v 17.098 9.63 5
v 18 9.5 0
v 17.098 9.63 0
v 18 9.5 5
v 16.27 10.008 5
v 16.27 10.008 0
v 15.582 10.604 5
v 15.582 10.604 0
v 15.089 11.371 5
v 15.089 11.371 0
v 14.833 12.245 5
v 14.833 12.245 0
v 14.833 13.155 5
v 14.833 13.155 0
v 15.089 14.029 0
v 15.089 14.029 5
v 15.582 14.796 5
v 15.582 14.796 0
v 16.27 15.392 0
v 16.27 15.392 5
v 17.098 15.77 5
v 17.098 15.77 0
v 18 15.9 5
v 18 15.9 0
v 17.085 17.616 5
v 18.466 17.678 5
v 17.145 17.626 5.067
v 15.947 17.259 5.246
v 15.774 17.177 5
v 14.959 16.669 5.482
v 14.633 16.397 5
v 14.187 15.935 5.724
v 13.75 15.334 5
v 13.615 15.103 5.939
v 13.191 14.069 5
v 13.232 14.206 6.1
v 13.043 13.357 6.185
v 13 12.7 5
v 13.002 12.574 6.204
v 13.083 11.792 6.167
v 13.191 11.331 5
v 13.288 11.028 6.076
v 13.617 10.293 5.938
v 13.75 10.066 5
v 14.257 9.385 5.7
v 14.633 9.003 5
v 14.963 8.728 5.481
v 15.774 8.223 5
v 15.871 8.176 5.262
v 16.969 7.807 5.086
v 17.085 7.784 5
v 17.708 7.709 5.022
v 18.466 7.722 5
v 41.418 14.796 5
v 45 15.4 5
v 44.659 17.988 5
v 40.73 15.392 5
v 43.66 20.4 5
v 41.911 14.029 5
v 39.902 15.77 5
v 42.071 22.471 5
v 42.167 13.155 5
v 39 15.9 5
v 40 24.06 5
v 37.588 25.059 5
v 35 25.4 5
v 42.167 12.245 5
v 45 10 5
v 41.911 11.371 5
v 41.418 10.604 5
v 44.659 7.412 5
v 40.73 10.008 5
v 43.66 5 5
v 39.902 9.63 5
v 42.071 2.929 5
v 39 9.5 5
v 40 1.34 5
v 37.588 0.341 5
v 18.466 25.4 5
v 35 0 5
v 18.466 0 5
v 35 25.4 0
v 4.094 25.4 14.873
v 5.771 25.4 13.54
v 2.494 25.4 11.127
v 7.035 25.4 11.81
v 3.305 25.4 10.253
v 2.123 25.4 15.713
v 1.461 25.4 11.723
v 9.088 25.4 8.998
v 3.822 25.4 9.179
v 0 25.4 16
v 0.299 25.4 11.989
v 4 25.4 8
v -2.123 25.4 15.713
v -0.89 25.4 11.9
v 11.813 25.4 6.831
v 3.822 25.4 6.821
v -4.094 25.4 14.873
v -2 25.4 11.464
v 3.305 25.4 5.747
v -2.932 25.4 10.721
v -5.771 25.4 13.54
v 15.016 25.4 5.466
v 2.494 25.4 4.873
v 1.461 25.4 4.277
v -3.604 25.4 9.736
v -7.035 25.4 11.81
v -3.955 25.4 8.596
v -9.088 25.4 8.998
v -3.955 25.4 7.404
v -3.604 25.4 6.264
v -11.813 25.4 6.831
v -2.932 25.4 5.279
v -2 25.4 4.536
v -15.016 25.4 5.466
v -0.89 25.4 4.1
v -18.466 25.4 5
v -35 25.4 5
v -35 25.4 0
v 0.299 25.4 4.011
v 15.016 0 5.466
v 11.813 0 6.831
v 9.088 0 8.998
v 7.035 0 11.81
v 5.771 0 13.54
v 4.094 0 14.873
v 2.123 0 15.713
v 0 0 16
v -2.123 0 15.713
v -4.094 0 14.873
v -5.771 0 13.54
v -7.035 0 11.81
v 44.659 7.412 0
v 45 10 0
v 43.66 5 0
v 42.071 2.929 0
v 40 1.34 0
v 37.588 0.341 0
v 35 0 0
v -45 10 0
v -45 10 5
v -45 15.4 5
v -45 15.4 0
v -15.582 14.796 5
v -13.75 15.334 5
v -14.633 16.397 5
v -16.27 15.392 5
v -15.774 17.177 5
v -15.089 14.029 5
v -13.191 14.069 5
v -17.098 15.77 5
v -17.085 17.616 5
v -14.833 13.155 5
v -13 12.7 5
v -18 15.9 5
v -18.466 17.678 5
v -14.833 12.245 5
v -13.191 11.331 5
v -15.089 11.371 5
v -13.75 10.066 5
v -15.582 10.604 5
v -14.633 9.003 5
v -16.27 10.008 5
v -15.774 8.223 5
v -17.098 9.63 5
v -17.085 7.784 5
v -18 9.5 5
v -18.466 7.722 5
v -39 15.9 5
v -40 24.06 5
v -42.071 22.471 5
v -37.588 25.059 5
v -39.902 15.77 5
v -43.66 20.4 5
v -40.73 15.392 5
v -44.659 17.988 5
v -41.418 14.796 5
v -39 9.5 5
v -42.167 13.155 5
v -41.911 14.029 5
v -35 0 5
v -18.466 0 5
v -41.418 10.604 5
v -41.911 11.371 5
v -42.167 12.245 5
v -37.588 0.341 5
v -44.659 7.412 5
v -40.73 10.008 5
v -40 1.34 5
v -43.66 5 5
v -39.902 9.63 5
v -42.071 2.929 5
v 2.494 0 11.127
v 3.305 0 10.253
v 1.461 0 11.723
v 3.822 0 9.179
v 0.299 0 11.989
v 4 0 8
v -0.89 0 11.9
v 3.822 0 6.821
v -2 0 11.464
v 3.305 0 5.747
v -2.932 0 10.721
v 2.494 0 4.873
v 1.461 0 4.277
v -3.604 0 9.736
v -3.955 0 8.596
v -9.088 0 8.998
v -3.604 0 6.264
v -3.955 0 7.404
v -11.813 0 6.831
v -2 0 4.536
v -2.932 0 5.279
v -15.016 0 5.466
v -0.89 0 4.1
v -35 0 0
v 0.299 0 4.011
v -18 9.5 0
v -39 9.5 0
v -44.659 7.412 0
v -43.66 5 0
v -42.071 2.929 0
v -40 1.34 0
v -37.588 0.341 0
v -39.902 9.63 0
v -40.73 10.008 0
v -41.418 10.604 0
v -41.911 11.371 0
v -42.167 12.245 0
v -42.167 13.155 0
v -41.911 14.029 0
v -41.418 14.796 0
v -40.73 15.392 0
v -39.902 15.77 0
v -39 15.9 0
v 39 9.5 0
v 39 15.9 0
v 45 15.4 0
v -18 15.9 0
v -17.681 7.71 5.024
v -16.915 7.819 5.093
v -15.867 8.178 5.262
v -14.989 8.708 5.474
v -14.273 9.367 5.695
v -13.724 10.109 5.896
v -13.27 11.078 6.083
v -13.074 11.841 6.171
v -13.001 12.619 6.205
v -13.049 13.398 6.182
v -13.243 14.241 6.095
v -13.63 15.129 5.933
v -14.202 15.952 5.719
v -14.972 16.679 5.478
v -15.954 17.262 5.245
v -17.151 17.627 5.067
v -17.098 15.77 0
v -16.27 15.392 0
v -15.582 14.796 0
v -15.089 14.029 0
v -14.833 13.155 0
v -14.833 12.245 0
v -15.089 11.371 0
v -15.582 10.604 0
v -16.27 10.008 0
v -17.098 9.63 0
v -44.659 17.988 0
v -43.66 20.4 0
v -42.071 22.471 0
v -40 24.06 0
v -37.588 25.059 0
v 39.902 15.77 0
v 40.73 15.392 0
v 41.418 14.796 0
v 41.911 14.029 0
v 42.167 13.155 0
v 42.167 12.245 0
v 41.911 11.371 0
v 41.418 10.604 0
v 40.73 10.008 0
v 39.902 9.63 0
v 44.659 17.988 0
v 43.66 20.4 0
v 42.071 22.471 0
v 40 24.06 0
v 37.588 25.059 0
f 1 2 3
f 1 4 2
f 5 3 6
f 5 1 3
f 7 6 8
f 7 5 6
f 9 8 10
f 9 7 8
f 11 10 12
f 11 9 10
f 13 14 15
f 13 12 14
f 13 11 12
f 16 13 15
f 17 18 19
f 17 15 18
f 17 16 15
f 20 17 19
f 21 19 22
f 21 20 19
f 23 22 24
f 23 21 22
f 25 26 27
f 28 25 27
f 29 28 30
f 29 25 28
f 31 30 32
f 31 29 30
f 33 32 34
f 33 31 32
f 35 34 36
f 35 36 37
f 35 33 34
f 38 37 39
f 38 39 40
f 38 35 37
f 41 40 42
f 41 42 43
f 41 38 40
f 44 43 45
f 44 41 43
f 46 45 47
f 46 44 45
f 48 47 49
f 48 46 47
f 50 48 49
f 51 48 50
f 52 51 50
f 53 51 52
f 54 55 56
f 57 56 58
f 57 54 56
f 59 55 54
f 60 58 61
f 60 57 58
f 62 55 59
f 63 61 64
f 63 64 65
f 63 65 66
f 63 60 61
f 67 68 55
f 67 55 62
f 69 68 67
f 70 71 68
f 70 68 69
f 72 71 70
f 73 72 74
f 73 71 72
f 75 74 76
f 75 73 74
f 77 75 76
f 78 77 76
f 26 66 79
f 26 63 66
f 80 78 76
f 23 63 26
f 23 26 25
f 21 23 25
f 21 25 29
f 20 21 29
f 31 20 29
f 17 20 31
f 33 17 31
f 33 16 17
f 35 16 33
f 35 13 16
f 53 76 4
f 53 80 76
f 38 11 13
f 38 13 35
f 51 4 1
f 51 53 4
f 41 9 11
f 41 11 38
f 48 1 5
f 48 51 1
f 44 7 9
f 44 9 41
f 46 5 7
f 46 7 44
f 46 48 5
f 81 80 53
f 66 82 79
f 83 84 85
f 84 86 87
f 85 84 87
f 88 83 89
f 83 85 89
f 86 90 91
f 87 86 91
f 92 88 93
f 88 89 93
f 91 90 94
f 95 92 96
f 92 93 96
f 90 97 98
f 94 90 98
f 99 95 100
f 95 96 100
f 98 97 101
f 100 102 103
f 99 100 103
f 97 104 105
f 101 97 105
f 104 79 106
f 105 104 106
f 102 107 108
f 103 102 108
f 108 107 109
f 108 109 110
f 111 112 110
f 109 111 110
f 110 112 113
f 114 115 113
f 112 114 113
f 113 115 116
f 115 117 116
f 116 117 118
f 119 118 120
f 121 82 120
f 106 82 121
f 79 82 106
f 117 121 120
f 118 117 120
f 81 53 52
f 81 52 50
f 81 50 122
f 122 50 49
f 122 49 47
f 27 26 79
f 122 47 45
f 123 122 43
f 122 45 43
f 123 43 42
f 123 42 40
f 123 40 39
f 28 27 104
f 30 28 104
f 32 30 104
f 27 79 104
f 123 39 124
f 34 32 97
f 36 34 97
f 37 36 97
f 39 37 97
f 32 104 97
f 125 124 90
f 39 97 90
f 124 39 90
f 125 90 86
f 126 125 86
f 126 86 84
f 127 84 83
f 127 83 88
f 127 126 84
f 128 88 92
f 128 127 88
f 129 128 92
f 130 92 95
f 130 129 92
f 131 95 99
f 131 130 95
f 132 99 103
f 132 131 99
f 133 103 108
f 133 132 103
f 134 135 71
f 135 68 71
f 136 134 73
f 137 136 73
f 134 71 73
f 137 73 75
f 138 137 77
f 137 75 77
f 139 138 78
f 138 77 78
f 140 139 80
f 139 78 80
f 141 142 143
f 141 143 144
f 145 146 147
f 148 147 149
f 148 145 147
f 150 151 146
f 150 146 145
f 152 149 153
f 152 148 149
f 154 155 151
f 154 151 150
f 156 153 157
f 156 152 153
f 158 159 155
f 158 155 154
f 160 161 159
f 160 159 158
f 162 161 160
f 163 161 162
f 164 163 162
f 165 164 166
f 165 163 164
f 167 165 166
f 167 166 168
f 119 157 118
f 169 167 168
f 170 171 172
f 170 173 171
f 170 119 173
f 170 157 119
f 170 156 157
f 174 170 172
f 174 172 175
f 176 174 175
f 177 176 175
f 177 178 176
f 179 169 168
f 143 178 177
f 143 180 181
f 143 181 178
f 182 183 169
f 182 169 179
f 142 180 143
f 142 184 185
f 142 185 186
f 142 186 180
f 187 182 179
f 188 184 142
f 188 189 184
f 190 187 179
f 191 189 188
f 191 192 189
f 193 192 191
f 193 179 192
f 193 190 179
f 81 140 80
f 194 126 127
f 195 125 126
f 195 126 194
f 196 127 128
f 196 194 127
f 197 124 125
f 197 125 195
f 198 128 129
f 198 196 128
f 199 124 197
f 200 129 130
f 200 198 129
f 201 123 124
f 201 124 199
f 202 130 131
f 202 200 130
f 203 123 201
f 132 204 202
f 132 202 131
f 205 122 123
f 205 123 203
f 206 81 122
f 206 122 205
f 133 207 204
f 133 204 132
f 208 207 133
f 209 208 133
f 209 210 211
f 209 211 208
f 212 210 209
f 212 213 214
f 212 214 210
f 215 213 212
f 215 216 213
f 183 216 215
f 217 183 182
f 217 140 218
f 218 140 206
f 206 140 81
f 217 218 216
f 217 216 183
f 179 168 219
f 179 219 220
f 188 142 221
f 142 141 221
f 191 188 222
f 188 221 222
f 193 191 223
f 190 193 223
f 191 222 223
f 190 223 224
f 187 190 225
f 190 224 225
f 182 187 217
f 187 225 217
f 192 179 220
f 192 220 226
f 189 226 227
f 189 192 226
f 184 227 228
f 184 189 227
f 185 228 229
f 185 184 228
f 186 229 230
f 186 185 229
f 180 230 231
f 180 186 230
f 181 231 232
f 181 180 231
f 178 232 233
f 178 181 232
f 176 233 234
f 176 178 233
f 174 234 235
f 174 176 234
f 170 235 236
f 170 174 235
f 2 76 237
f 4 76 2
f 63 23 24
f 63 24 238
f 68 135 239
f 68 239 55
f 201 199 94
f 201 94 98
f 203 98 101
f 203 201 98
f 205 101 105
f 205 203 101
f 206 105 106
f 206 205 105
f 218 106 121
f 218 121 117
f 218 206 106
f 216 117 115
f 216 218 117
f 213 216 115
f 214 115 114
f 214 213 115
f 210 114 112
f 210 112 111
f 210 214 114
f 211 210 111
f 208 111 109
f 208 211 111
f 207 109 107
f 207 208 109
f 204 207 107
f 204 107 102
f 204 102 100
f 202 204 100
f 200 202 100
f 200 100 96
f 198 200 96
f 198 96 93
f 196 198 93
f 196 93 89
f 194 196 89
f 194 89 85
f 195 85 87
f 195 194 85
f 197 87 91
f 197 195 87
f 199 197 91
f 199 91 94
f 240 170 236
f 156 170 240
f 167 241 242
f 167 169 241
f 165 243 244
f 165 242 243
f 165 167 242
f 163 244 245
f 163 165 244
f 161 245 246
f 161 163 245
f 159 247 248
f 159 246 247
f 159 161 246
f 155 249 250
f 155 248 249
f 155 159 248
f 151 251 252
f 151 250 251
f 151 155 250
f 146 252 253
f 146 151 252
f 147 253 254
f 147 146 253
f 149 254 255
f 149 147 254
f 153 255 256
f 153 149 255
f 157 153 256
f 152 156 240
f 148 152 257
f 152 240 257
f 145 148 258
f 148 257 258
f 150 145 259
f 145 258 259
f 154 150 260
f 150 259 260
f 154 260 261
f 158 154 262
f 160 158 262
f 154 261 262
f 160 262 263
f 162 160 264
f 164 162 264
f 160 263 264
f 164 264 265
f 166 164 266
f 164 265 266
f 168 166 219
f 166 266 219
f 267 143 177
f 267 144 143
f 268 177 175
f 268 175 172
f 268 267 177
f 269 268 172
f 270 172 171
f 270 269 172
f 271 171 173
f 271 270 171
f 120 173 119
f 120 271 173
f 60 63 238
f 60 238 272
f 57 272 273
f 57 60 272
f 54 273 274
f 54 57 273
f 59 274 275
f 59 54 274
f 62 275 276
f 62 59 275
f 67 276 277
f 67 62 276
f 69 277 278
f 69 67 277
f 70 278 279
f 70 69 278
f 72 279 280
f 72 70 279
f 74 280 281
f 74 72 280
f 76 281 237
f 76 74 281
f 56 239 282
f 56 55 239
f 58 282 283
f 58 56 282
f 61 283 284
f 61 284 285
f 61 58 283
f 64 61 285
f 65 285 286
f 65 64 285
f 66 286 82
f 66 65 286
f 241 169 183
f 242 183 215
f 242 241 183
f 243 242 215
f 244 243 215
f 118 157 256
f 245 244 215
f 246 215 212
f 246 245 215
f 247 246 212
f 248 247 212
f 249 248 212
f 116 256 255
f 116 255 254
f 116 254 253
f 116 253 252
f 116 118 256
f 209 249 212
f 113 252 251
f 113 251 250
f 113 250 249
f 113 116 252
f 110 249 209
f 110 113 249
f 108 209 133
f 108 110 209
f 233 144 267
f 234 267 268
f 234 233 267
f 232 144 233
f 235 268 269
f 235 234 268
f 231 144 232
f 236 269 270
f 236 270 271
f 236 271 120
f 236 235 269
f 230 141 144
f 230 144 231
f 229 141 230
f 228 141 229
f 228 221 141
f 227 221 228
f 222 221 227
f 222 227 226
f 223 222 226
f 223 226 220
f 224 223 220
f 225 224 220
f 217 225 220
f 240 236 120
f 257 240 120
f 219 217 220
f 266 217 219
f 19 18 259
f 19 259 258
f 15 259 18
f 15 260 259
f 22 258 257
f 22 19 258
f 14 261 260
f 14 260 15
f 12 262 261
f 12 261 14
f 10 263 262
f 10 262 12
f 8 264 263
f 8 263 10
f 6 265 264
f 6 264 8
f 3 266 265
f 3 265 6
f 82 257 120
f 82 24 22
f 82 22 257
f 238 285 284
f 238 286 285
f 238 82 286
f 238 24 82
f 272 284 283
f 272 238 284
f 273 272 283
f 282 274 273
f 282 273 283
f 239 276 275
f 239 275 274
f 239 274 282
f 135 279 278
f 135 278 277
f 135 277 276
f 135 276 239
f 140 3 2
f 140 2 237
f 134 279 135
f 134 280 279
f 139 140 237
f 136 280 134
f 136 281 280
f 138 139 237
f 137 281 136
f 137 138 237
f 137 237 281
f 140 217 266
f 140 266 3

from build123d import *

# Parameters (mm, degrees)
SKETCH1_R               = 4
BOSS_EXTRUDE1_DEPTH     = 25.4
FILLET1_R               = 13
CUT_EXTRUDE1_DEPTH      = 12
CUT_EXTRUDE1_DEPTH_BACK = 6
SKETCH3_R               = 5
CUT_EXTRUDE2_DEPTH      = 25.4
FILLET2_R               = 10


with BuildPart() as part:
    # Sketch1 → Boss-Extrude1 (new body)
    with BuildSketch(Plane(origin=(0, 0, 0), x_dir=(1, 0, 0), z_dir=(0, 1, 0))):
        with BuildLine():
            Line((-45, 0), (45, 0))
            Line((45, 0), (45, -5))
            Line((45, -5), (7.416198487, -5))
            ThreePointArc((7.416198487, -5), (0, -16), (-7.416198487, -5))
            Line((-7.416198487, -5), (-45, -5))
            Line((-45, -5), (-45, 0))
        make_face()
        with Locations((0, -8)):
            Circle(SKETCH1_R, mode=Mode.SUBTRACT)
    extrude(amount=BOSS_EXTRUDE1_DEPTH)

    # Fillet1
    fillet1_edges = [part.edges().sort_by_distance(p)[0] for p in [
        (7.416198487, 12.7, 5),
        (-7.416198487, 12.7, 5),
    ]]
    fillet(fillet1_edges, radius=FILLET1_R)

    # Sketch2 → Cut-Extrude1 (cut, two sides)
    with BuildSketch(Plane.XY.offset(5)) as cut_extrude1_sk:
        with BuildLine():
            Line((-39, 15.9), (-18, 15.9))
            ThreePointArc((-18, 15.9), (-14.8, 12.7), (-18, 9.5))
            Line((-18, 9.5), (-39, 9.5))
            ThreePointArc((-39, 9.5), (-42.2, 12.7), (-39, 15.9))
        make_face()
        with BuildLine():
            Line((39, 9.5), (18, 9.5))
            ThreePointArc((18, 9.5), (14.8, 12.7), (18, 15.9))
            Line((18, 15.9), (39, 15.9))
            ThreePointArc((39, 15.9), (42.2, 12.7), (39, 9.5))
        make_face()
    extrude(amount=CUT_EXTRUDE1_DEPTH, mode=Mode.SUBTRACT)
    extrude(cut_extrude1_sk.sketch, amount=-CUT_EXTRUDE1_DEPTH_BACK, mode=Mode.SUBTRACT)

    # Sketch3 → Cut-Extrude2 (cut)
    with BuildSketch(Plane.XY.offset(5)):
        with Locations((-18, 12.7)):
            Circle(SKETCH3_R)
        with Locations((18, 12.7)):
            Circle(SKETCH3_R)
    extrude(amount=CUT_EXTRUDE2_DEPTH, mode=Mode.SUBTRACT)

    # Fillet2
    fillet2_edges = [part.edges().sort_by_distance(p)[0] for p in [
        (-45, 25.4, 2.5),
        (45, 25.4, 2.5),
        (-45, 0, 2.5),
        (45, 0, 2.5),
    ]]
    fillet(fillet2_edges, radius=FILLET2_R)


solid = part.part
